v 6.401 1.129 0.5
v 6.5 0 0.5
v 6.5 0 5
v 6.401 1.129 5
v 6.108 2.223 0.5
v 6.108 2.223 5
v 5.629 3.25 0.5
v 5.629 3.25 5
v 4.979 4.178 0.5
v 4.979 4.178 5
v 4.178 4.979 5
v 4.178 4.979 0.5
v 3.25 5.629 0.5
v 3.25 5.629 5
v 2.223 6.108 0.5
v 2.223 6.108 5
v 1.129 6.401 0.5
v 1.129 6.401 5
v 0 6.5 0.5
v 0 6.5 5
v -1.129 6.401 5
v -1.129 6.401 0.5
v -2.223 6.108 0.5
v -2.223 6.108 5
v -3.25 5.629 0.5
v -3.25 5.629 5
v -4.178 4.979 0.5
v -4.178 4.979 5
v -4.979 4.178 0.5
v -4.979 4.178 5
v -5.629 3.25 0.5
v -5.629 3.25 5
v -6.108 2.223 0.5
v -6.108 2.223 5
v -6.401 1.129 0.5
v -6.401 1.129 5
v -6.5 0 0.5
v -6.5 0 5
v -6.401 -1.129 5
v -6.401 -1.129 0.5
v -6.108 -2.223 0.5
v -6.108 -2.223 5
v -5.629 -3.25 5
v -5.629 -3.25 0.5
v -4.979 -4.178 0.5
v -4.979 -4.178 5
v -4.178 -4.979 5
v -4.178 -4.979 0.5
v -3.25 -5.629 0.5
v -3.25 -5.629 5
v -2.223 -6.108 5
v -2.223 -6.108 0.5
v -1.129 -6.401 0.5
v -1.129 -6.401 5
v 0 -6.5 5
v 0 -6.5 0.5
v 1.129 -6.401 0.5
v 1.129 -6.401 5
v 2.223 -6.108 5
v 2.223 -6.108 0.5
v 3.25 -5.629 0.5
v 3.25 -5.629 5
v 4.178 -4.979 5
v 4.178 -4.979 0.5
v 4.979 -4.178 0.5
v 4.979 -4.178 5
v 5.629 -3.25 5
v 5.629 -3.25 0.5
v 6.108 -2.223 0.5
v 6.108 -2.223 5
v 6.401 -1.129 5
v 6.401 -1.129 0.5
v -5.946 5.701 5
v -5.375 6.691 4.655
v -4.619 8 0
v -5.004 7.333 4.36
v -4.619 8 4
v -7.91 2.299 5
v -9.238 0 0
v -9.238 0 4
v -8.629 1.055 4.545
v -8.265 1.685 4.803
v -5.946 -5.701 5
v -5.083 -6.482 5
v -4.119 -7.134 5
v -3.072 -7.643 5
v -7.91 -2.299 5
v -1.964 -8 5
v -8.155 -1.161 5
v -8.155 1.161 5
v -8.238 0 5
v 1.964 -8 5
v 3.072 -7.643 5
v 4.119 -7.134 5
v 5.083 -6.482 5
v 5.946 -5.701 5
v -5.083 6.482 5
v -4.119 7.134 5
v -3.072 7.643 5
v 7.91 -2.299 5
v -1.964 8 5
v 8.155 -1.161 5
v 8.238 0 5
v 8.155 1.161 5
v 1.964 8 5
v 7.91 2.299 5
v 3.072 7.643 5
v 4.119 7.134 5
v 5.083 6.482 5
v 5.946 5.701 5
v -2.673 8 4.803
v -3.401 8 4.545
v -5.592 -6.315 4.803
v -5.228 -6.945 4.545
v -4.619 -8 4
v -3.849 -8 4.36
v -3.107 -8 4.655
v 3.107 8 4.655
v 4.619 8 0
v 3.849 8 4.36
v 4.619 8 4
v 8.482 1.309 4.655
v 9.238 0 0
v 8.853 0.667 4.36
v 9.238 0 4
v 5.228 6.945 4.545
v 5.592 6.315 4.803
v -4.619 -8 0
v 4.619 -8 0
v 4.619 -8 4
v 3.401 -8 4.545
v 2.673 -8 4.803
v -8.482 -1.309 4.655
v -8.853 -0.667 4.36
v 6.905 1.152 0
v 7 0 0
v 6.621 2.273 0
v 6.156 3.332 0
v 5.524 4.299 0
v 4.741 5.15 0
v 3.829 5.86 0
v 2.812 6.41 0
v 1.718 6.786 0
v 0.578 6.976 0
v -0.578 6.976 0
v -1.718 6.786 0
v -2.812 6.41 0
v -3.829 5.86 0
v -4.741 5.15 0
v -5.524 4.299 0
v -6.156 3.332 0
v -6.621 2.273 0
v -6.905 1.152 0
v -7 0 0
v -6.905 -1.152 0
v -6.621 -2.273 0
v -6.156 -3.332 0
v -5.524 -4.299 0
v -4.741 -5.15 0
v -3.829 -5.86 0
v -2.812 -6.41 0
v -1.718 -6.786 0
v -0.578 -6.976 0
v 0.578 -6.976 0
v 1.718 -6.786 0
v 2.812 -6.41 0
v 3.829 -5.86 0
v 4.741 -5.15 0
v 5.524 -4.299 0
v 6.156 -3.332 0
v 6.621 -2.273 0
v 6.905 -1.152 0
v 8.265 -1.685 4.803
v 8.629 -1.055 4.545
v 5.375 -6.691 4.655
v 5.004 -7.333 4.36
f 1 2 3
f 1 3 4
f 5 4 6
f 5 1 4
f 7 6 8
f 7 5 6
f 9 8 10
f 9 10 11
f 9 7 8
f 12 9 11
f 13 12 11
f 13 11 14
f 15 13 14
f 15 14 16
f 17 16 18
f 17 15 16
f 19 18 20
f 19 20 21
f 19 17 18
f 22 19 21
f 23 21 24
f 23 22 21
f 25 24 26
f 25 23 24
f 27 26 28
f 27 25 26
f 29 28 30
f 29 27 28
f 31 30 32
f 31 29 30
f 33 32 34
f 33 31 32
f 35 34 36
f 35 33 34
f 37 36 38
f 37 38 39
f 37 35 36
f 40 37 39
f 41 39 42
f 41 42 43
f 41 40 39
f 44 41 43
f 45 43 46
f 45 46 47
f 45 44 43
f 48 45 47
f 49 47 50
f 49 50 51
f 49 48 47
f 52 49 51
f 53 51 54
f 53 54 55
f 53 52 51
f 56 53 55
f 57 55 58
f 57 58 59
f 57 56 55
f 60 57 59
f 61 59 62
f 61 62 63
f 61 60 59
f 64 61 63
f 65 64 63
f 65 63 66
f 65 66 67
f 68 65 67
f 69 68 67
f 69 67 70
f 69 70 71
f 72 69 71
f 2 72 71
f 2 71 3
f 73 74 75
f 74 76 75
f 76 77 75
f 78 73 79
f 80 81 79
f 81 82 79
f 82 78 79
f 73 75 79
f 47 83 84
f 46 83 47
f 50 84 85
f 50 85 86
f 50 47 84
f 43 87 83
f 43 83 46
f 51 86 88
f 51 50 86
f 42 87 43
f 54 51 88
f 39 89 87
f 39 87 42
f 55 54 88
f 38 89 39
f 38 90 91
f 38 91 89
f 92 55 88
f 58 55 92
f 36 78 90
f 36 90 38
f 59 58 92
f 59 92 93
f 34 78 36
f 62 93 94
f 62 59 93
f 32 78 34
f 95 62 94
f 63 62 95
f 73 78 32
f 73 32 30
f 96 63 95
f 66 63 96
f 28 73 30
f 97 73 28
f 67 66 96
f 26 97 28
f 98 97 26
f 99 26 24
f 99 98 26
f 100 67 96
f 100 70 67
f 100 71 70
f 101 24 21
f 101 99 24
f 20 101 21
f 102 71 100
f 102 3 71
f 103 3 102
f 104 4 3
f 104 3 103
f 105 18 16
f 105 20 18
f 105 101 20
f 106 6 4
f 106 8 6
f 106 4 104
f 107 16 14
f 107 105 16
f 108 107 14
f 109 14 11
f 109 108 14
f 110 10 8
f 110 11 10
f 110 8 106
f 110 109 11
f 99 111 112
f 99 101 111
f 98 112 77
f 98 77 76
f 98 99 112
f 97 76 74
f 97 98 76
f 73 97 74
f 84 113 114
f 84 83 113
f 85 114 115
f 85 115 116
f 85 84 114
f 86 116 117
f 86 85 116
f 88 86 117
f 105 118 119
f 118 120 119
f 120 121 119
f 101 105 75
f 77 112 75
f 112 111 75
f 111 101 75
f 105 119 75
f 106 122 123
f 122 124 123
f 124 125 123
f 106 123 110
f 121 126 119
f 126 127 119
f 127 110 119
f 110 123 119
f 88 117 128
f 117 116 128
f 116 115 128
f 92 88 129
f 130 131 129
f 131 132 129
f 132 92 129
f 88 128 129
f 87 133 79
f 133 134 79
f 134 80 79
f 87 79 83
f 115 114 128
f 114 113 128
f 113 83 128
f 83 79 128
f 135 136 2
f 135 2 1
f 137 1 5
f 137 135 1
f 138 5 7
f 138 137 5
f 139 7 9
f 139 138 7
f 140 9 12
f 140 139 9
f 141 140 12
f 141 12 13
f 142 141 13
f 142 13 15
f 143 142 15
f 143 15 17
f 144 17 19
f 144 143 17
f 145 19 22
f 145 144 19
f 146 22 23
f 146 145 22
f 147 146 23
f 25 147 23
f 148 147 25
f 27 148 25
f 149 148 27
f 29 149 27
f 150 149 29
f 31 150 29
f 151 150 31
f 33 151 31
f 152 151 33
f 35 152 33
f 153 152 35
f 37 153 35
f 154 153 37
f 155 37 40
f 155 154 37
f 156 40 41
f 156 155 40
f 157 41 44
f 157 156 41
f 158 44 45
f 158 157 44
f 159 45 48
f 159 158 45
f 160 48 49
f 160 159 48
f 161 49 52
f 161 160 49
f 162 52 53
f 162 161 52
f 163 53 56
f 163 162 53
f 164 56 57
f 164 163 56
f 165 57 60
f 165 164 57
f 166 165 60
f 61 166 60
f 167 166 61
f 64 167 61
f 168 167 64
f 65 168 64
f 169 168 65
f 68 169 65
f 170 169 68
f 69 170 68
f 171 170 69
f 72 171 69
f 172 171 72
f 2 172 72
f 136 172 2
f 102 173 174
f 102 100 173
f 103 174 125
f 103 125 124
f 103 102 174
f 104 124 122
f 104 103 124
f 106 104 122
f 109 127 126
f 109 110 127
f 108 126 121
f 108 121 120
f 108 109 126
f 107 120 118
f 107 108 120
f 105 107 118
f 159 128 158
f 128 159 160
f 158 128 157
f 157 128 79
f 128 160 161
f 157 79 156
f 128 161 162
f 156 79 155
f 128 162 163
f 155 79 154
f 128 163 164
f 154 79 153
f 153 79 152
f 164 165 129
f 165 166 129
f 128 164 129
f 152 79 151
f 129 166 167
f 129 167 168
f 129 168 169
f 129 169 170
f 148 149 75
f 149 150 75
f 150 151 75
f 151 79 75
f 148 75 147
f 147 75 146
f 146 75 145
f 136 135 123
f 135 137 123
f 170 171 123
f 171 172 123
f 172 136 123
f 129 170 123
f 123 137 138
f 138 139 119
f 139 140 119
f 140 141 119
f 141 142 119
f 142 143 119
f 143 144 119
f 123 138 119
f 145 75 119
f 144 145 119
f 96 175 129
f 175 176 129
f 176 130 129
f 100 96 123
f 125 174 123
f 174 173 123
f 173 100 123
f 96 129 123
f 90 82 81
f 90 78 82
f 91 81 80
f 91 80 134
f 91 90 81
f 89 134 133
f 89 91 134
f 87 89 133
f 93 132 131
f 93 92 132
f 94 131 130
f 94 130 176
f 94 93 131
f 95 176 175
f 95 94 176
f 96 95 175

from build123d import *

# Parameters (mm, degrees)
SZKIC1_R                    = 6.5
DODANIE_WYCI_GNI_CIE3_DEPTH = 5
SFAZOWANIE3_SIZE            = 0.5


with BuildPart() as part:
    # Szkic1 → Dodanie-wyciągnięcie3 (new body)
    with BuildSketch(Plane.XY):
        Polygon((9.237604307, 0), (4.618802154, 8), (-4.618802154, 8), (-9.237604307, 0), (-4.618802154, -8), (4.618802154, -8), align=None)
        Circle(SZKIC1_R, mode=Mode.SUBTRACT)
    extrude(amount=DODANIE_WYCI_GNI_CIE3_DEPTH)

    # Szkic2 → Wycięcie-obrót3 (revolve, cut)
    with BuildSketch(Plane(origin=(0, 0, 0), x_dir=(1, 0, 0), z_dir=(0, 1, 0))):
        Polygon((9.237604307, -5), (9.237604307, -4), (8.237604307, -5), align=None)
    revolve(axis=Axis((0, 0, 0), (0, 0, 1)), mode=Mode.SUBTRACT)

    # Sfazowanie3
    sfazowanie3_edges = [part.edges().sort_by_distance(p)[0] for p in [
        (-6.5, 0, 0),
    ]]
    chamfer(sfazowanie3_edges, length=SFAZOWANIE3_SIZE)


solid = part.part
